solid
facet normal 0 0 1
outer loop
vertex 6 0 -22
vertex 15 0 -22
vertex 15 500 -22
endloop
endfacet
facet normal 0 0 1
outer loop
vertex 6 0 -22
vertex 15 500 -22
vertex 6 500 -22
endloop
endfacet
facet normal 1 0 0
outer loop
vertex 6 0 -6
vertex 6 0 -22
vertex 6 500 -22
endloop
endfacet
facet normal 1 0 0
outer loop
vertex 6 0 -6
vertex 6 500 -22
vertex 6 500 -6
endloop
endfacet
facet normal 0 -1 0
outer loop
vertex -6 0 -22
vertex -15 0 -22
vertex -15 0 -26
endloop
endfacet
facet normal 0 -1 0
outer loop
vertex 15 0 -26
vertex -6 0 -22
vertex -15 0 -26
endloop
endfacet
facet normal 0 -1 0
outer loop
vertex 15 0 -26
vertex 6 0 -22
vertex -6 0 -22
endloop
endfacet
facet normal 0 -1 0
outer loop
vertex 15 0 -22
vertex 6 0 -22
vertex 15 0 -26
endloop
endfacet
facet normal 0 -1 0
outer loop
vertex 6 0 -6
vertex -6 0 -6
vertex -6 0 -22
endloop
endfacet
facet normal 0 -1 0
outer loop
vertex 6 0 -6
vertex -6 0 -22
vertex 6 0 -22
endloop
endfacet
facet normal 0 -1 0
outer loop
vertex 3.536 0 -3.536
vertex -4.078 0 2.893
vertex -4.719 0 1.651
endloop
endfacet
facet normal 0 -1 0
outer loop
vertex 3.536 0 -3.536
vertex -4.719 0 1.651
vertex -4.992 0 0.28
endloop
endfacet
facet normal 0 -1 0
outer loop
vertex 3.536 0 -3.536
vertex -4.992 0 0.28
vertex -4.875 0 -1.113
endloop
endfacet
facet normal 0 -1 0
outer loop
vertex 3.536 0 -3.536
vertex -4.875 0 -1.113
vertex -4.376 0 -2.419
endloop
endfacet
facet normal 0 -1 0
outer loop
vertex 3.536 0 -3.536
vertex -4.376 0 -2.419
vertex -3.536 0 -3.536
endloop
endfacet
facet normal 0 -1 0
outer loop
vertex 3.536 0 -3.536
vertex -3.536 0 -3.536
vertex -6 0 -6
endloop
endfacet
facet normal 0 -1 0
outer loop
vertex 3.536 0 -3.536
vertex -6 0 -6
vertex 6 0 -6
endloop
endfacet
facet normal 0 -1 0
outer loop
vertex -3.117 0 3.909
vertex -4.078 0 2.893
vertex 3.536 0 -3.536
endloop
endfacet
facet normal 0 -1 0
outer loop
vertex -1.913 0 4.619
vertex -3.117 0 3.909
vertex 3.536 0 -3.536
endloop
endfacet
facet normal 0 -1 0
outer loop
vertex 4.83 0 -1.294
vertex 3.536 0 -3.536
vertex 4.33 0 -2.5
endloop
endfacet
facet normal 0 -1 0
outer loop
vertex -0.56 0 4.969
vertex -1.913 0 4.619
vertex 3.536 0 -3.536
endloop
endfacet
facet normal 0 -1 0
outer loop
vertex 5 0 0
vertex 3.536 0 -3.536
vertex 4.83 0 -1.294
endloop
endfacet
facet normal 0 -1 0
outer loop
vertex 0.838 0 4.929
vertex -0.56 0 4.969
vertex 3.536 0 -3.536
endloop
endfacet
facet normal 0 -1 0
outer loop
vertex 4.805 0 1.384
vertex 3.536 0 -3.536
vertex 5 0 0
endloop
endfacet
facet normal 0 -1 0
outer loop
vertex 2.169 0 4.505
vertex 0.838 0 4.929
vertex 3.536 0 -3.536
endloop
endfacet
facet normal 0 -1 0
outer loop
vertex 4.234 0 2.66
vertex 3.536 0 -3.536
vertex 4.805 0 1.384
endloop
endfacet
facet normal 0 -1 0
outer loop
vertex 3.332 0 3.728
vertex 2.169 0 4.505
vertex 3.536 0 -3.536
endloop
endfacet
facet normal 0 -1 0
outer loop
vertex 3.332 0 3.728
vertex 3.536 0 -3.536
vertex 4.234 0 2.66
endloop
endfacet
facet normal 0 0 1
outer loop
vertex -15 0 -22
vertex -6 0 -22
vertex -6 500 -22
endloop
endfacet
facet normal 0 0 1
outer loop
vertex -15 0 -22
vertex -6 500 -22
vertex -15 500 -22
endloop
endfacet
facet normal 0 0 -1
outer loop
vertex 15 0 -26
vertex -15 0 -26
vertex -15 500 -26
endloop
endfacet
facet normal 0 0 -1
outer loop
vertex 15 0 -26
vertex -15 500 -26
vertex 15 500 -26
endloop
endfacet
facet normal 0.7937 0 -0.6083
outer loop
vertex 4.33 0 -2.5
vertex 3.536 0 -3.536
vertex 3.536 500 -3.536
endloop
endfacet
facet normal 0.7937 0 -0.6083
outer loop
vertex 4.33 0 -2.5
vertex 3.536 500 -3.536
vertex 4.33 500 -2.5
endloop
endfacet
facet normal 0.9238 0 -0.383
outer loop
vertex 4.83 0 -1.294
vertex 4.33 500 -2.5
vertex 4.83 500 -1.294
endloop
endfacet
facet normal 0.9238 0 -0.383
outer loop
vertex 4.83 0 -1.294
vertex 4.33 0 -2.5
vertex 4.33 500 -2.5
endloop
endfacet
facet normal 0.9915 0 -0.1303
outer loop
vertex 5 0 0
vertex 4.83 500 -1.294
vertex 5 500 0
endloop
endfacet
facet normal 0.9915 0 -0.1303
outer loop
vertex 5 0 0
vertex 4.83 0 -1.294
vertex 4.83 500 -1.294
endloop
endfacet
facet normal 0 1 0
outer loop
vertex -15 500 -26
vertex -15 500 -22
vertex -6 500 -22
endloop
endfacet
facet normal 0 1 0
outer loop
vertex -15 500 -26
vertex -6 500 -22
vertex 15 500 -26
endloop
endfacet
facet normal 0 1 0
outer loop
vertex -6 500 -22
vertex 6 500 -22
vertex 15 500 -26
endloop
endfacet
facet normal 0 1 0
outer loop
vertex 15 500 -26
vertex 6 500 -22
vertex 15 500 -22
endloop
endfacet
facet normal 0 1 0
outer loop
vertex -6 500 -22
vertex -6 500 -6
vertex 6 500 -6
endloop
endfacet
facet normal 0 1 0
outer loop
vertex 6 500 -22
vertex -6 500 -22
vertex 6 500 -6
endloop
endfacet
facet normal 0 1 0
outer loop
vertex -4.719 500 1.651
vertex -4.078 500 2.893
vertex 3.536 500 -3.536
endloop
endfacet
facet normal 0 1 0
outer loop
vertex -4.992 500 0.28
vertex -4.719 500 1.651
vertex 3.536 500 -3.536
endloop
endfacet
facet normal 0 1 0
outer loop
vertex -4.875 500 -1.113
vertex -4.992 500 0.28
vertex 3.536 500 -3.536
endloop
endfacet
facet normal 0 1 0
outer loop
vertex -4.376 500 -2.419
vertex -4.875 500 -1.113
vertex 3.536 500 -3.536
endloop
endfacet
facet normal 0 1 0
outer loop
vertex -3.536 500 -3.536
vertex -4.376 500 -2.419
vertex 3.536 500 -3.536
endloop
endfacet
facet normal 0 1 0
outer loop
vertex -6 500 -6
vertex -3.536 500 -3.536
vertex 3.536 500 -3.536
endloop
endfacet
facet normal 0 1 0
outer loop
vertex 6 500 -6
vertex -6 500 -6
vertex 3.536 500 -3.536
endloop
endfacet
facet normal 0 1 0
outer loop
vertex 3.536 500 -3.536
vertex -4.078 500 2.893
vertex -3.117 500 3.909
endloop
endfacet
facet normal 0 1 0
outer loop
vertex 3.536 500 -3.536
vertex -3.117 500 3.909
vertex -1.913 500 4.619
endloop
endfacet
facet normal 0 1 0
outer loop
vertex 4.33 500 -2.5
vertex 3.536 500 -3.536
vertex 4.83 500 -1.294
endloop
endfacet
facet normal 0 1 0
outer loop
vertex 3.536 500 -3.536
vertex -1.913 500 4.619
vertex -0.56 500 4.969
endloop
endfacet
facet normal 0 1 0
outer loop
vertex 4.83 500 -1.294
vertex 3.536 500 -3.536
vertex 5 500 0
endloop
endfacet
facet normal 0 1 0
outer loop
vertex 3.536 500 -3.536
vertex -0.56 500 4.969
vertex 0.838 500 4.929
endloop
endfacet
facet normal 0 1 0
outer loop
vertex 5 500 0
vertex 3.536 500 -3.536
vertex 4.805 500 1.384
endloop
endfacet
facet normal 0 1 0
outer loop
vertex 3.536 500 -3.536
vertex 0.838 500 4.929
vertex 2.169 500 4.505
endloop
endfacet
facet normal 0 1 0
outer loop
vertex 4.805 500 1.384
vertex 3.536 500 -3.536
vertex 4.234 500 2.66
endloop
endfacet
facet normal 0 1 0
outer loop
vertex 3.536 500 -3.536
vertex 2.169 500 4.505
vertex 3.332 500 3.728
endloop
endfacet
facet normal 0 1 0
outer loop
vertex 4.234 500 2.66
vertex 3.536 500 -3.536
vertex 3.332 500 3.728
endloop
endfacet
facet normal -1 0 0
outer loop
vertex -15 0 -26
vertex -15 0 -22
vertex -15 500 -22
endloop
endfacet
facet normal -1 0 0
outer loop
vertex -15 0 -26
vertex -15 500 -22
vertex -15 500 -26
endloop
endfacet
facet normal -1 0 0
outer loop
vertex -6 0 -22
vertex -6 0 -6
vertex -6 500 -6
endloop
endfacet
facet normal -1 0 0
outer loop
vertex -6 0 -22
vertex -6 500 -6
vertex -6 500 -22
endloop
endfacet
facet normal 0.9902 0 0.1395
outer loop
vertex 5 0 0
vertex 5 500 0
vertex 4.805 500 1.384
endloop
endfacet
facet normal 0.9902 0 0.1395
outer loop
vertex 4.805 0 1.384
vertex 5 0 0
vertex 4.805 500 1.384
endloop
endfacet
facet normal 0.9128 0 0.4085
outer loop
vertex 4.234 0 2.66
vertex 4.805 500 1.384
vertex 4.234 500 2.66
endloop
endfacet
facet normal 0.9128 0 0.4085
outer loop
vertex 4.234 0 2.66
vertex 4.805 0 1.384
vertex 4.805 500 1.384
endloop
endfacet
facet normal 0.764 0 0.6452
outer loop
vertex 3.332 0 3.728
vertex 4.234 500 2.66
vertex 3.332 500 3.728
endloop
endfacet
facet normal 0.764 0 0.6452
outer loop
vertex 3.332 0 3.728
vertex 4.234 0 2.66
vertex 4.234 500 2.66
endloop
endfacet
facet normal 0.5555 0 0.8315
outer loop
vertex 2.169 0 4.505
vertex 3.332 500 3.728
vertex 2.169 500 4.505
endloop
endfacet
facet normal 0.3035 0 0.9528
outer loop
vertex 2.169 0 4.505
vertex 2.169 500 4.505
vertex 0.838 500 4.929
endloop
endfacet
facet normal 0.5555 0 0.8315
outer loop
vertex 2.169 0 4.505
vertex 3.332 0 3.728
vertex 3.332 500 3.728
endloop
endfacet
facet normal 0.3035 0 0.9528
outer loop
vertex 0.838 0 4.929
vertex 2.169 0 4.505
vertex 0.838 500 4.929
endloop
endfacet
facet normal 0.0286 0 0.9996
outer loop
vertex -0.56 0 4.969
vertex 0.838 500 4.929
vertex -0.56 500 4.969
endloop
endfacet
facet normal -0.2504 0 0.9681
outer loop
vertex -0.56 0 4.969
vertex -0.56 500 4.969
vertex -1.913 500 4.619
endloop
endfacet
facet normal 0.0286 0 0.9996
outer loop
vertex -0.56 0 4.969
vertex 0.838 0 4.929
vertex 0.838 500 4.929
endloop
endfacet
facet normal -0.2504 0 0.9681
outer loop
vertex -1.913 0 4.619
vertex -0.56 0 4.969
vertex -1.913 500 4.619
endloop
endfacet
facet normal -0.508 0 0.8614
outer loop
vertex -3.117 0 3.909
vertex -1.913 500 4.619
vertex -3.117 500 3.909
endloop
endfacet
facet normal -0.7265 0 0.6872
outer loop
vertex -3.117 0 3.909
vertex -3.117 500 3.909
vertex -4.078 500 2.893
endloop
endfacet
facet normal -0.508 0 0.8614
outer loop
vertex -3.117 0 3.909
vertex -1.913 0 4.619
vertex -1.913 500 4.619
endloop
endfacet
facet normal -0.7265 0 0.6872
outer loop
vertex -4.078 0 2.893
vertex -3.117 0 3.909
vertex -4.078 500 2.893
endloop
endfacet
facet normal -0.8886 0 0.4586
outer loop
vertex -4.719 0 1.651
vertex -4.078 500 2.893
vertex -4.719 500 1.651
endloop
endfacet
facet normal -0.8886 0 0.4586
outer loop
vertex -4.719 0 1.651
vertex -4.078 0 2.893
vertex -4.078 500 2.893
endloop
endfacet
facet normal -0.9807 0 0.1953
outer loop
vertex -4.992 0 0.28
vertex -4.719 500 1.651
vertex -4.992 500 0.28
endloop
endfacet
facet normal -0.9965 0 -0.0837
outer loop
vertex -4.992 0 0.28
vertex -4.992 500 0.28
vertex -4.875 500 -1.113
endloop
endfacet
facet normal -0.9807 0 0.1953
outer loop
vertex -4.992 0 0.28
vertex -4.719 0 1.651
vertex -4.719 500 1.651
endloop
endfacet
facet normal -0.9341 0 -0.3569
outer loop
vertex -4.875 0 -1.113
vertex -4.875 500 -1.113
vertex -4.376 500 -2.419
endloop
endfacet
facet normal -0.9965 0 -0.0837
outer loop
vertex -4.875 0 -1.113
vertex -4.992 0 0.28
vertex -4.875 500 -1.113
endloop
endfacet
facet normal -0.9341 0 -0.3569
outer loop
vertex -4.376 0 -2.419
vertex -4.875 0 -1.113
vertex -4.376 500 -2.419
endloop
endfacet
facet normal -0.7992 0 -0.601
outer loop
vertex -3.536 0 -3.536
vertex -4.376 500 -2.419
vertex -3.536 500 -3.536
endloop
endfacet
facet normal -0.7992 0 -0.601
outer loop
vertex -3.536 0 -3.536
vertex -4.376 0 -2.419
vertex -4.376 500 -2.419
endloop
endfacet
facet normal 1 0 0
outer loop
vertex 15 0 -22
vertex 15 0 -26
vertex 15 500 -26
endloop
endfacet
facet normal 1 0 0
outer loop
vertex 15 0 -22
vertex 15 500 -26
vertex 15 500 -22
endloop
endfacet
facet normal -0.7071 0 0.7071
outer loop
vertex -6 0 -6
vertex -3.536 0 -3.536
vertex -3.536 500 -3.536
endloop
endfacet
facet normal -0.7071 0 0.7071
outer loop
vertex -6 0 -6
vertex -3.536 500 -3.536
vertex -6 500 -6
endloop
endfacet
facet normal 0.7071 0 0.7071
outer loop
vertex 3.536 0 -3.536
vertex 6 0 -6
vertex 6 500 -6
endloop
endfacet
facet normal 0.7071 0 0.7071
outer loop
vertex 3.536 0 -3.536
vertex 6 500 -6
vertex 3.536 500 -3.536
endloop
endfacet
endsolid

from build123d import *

# Parameters (mm, degrees)
F1_DEPTH = 500


with BuildPart() as f1:
    # F0 (on Front) → F1 (new body)
    with BuildSketch(Plane.XZ):
        with BuildLine():
            ThreePointArc((3.5355339059, -3.5355339059), (4.6193976626, -1.9134171618), (5, 0))
            ThreePointArc((5, 0), (-1.9134171618, 4.6193976626), (-3.5355339059, -3.5355339059))
            Line((-3.5355339059, -3.5355339059), (0, 0))
            Line((0, 0), (3.5355339059, -3.5355339059))
        make_face()
        with BuildLine():
            Line((0, 0), (-3.5355339059, -3.5355339059))
            ThreePointArc((-3.5355339059, -3.5355339059), (-1.9134171618, -4.6193976626), (0, -5))
            Line((0, -5), (0, 0))
        make_face()
        with BuildLine():
            ThreePointArc((0, -5), (-1.9134171618, -4.6193976626), (-3.5355339059, -3.5355339059))
            Line((-3.5355339059, -3.5355339059), (-6, -6))
            Line((-6, -6), (-6, -22))
            Line((-6, -22), (0, -22))
            Line((0, -22), (0, -5))
        make_face()
        with BuildLine():
            Line((6, -6), (3.5355339059, -3.5355339059))
            ThreePointArc((3.5355339059, -3.5355339059), (1.9134171618, -4.6193976626), (0, -5))
            Line((0, -5), (0, -22))
            Line((0, -22), (6, -22))
            Line((6, -22), (6, -6))
        make_face()
        with BuildLine():
            ThreePointArc((0, -5), (1.9134171618, -4.6193976626), (3.5355339059, -3.5355339059))
            Line((3.5355339059, -3.5355339059), (0, 0))
            Line((0, 0), (0, -5))
        make_face()
        Polygon((6, -22), (0, -22), (0, -26), (15, -26), (15, -22), align=None)
        Polygon((0, -26), (0, -22), (-6, -22), (-15, -22), (-15, -26), align=None)
    extrude(amount=-F1_DEPTH)


solid = f1.part
